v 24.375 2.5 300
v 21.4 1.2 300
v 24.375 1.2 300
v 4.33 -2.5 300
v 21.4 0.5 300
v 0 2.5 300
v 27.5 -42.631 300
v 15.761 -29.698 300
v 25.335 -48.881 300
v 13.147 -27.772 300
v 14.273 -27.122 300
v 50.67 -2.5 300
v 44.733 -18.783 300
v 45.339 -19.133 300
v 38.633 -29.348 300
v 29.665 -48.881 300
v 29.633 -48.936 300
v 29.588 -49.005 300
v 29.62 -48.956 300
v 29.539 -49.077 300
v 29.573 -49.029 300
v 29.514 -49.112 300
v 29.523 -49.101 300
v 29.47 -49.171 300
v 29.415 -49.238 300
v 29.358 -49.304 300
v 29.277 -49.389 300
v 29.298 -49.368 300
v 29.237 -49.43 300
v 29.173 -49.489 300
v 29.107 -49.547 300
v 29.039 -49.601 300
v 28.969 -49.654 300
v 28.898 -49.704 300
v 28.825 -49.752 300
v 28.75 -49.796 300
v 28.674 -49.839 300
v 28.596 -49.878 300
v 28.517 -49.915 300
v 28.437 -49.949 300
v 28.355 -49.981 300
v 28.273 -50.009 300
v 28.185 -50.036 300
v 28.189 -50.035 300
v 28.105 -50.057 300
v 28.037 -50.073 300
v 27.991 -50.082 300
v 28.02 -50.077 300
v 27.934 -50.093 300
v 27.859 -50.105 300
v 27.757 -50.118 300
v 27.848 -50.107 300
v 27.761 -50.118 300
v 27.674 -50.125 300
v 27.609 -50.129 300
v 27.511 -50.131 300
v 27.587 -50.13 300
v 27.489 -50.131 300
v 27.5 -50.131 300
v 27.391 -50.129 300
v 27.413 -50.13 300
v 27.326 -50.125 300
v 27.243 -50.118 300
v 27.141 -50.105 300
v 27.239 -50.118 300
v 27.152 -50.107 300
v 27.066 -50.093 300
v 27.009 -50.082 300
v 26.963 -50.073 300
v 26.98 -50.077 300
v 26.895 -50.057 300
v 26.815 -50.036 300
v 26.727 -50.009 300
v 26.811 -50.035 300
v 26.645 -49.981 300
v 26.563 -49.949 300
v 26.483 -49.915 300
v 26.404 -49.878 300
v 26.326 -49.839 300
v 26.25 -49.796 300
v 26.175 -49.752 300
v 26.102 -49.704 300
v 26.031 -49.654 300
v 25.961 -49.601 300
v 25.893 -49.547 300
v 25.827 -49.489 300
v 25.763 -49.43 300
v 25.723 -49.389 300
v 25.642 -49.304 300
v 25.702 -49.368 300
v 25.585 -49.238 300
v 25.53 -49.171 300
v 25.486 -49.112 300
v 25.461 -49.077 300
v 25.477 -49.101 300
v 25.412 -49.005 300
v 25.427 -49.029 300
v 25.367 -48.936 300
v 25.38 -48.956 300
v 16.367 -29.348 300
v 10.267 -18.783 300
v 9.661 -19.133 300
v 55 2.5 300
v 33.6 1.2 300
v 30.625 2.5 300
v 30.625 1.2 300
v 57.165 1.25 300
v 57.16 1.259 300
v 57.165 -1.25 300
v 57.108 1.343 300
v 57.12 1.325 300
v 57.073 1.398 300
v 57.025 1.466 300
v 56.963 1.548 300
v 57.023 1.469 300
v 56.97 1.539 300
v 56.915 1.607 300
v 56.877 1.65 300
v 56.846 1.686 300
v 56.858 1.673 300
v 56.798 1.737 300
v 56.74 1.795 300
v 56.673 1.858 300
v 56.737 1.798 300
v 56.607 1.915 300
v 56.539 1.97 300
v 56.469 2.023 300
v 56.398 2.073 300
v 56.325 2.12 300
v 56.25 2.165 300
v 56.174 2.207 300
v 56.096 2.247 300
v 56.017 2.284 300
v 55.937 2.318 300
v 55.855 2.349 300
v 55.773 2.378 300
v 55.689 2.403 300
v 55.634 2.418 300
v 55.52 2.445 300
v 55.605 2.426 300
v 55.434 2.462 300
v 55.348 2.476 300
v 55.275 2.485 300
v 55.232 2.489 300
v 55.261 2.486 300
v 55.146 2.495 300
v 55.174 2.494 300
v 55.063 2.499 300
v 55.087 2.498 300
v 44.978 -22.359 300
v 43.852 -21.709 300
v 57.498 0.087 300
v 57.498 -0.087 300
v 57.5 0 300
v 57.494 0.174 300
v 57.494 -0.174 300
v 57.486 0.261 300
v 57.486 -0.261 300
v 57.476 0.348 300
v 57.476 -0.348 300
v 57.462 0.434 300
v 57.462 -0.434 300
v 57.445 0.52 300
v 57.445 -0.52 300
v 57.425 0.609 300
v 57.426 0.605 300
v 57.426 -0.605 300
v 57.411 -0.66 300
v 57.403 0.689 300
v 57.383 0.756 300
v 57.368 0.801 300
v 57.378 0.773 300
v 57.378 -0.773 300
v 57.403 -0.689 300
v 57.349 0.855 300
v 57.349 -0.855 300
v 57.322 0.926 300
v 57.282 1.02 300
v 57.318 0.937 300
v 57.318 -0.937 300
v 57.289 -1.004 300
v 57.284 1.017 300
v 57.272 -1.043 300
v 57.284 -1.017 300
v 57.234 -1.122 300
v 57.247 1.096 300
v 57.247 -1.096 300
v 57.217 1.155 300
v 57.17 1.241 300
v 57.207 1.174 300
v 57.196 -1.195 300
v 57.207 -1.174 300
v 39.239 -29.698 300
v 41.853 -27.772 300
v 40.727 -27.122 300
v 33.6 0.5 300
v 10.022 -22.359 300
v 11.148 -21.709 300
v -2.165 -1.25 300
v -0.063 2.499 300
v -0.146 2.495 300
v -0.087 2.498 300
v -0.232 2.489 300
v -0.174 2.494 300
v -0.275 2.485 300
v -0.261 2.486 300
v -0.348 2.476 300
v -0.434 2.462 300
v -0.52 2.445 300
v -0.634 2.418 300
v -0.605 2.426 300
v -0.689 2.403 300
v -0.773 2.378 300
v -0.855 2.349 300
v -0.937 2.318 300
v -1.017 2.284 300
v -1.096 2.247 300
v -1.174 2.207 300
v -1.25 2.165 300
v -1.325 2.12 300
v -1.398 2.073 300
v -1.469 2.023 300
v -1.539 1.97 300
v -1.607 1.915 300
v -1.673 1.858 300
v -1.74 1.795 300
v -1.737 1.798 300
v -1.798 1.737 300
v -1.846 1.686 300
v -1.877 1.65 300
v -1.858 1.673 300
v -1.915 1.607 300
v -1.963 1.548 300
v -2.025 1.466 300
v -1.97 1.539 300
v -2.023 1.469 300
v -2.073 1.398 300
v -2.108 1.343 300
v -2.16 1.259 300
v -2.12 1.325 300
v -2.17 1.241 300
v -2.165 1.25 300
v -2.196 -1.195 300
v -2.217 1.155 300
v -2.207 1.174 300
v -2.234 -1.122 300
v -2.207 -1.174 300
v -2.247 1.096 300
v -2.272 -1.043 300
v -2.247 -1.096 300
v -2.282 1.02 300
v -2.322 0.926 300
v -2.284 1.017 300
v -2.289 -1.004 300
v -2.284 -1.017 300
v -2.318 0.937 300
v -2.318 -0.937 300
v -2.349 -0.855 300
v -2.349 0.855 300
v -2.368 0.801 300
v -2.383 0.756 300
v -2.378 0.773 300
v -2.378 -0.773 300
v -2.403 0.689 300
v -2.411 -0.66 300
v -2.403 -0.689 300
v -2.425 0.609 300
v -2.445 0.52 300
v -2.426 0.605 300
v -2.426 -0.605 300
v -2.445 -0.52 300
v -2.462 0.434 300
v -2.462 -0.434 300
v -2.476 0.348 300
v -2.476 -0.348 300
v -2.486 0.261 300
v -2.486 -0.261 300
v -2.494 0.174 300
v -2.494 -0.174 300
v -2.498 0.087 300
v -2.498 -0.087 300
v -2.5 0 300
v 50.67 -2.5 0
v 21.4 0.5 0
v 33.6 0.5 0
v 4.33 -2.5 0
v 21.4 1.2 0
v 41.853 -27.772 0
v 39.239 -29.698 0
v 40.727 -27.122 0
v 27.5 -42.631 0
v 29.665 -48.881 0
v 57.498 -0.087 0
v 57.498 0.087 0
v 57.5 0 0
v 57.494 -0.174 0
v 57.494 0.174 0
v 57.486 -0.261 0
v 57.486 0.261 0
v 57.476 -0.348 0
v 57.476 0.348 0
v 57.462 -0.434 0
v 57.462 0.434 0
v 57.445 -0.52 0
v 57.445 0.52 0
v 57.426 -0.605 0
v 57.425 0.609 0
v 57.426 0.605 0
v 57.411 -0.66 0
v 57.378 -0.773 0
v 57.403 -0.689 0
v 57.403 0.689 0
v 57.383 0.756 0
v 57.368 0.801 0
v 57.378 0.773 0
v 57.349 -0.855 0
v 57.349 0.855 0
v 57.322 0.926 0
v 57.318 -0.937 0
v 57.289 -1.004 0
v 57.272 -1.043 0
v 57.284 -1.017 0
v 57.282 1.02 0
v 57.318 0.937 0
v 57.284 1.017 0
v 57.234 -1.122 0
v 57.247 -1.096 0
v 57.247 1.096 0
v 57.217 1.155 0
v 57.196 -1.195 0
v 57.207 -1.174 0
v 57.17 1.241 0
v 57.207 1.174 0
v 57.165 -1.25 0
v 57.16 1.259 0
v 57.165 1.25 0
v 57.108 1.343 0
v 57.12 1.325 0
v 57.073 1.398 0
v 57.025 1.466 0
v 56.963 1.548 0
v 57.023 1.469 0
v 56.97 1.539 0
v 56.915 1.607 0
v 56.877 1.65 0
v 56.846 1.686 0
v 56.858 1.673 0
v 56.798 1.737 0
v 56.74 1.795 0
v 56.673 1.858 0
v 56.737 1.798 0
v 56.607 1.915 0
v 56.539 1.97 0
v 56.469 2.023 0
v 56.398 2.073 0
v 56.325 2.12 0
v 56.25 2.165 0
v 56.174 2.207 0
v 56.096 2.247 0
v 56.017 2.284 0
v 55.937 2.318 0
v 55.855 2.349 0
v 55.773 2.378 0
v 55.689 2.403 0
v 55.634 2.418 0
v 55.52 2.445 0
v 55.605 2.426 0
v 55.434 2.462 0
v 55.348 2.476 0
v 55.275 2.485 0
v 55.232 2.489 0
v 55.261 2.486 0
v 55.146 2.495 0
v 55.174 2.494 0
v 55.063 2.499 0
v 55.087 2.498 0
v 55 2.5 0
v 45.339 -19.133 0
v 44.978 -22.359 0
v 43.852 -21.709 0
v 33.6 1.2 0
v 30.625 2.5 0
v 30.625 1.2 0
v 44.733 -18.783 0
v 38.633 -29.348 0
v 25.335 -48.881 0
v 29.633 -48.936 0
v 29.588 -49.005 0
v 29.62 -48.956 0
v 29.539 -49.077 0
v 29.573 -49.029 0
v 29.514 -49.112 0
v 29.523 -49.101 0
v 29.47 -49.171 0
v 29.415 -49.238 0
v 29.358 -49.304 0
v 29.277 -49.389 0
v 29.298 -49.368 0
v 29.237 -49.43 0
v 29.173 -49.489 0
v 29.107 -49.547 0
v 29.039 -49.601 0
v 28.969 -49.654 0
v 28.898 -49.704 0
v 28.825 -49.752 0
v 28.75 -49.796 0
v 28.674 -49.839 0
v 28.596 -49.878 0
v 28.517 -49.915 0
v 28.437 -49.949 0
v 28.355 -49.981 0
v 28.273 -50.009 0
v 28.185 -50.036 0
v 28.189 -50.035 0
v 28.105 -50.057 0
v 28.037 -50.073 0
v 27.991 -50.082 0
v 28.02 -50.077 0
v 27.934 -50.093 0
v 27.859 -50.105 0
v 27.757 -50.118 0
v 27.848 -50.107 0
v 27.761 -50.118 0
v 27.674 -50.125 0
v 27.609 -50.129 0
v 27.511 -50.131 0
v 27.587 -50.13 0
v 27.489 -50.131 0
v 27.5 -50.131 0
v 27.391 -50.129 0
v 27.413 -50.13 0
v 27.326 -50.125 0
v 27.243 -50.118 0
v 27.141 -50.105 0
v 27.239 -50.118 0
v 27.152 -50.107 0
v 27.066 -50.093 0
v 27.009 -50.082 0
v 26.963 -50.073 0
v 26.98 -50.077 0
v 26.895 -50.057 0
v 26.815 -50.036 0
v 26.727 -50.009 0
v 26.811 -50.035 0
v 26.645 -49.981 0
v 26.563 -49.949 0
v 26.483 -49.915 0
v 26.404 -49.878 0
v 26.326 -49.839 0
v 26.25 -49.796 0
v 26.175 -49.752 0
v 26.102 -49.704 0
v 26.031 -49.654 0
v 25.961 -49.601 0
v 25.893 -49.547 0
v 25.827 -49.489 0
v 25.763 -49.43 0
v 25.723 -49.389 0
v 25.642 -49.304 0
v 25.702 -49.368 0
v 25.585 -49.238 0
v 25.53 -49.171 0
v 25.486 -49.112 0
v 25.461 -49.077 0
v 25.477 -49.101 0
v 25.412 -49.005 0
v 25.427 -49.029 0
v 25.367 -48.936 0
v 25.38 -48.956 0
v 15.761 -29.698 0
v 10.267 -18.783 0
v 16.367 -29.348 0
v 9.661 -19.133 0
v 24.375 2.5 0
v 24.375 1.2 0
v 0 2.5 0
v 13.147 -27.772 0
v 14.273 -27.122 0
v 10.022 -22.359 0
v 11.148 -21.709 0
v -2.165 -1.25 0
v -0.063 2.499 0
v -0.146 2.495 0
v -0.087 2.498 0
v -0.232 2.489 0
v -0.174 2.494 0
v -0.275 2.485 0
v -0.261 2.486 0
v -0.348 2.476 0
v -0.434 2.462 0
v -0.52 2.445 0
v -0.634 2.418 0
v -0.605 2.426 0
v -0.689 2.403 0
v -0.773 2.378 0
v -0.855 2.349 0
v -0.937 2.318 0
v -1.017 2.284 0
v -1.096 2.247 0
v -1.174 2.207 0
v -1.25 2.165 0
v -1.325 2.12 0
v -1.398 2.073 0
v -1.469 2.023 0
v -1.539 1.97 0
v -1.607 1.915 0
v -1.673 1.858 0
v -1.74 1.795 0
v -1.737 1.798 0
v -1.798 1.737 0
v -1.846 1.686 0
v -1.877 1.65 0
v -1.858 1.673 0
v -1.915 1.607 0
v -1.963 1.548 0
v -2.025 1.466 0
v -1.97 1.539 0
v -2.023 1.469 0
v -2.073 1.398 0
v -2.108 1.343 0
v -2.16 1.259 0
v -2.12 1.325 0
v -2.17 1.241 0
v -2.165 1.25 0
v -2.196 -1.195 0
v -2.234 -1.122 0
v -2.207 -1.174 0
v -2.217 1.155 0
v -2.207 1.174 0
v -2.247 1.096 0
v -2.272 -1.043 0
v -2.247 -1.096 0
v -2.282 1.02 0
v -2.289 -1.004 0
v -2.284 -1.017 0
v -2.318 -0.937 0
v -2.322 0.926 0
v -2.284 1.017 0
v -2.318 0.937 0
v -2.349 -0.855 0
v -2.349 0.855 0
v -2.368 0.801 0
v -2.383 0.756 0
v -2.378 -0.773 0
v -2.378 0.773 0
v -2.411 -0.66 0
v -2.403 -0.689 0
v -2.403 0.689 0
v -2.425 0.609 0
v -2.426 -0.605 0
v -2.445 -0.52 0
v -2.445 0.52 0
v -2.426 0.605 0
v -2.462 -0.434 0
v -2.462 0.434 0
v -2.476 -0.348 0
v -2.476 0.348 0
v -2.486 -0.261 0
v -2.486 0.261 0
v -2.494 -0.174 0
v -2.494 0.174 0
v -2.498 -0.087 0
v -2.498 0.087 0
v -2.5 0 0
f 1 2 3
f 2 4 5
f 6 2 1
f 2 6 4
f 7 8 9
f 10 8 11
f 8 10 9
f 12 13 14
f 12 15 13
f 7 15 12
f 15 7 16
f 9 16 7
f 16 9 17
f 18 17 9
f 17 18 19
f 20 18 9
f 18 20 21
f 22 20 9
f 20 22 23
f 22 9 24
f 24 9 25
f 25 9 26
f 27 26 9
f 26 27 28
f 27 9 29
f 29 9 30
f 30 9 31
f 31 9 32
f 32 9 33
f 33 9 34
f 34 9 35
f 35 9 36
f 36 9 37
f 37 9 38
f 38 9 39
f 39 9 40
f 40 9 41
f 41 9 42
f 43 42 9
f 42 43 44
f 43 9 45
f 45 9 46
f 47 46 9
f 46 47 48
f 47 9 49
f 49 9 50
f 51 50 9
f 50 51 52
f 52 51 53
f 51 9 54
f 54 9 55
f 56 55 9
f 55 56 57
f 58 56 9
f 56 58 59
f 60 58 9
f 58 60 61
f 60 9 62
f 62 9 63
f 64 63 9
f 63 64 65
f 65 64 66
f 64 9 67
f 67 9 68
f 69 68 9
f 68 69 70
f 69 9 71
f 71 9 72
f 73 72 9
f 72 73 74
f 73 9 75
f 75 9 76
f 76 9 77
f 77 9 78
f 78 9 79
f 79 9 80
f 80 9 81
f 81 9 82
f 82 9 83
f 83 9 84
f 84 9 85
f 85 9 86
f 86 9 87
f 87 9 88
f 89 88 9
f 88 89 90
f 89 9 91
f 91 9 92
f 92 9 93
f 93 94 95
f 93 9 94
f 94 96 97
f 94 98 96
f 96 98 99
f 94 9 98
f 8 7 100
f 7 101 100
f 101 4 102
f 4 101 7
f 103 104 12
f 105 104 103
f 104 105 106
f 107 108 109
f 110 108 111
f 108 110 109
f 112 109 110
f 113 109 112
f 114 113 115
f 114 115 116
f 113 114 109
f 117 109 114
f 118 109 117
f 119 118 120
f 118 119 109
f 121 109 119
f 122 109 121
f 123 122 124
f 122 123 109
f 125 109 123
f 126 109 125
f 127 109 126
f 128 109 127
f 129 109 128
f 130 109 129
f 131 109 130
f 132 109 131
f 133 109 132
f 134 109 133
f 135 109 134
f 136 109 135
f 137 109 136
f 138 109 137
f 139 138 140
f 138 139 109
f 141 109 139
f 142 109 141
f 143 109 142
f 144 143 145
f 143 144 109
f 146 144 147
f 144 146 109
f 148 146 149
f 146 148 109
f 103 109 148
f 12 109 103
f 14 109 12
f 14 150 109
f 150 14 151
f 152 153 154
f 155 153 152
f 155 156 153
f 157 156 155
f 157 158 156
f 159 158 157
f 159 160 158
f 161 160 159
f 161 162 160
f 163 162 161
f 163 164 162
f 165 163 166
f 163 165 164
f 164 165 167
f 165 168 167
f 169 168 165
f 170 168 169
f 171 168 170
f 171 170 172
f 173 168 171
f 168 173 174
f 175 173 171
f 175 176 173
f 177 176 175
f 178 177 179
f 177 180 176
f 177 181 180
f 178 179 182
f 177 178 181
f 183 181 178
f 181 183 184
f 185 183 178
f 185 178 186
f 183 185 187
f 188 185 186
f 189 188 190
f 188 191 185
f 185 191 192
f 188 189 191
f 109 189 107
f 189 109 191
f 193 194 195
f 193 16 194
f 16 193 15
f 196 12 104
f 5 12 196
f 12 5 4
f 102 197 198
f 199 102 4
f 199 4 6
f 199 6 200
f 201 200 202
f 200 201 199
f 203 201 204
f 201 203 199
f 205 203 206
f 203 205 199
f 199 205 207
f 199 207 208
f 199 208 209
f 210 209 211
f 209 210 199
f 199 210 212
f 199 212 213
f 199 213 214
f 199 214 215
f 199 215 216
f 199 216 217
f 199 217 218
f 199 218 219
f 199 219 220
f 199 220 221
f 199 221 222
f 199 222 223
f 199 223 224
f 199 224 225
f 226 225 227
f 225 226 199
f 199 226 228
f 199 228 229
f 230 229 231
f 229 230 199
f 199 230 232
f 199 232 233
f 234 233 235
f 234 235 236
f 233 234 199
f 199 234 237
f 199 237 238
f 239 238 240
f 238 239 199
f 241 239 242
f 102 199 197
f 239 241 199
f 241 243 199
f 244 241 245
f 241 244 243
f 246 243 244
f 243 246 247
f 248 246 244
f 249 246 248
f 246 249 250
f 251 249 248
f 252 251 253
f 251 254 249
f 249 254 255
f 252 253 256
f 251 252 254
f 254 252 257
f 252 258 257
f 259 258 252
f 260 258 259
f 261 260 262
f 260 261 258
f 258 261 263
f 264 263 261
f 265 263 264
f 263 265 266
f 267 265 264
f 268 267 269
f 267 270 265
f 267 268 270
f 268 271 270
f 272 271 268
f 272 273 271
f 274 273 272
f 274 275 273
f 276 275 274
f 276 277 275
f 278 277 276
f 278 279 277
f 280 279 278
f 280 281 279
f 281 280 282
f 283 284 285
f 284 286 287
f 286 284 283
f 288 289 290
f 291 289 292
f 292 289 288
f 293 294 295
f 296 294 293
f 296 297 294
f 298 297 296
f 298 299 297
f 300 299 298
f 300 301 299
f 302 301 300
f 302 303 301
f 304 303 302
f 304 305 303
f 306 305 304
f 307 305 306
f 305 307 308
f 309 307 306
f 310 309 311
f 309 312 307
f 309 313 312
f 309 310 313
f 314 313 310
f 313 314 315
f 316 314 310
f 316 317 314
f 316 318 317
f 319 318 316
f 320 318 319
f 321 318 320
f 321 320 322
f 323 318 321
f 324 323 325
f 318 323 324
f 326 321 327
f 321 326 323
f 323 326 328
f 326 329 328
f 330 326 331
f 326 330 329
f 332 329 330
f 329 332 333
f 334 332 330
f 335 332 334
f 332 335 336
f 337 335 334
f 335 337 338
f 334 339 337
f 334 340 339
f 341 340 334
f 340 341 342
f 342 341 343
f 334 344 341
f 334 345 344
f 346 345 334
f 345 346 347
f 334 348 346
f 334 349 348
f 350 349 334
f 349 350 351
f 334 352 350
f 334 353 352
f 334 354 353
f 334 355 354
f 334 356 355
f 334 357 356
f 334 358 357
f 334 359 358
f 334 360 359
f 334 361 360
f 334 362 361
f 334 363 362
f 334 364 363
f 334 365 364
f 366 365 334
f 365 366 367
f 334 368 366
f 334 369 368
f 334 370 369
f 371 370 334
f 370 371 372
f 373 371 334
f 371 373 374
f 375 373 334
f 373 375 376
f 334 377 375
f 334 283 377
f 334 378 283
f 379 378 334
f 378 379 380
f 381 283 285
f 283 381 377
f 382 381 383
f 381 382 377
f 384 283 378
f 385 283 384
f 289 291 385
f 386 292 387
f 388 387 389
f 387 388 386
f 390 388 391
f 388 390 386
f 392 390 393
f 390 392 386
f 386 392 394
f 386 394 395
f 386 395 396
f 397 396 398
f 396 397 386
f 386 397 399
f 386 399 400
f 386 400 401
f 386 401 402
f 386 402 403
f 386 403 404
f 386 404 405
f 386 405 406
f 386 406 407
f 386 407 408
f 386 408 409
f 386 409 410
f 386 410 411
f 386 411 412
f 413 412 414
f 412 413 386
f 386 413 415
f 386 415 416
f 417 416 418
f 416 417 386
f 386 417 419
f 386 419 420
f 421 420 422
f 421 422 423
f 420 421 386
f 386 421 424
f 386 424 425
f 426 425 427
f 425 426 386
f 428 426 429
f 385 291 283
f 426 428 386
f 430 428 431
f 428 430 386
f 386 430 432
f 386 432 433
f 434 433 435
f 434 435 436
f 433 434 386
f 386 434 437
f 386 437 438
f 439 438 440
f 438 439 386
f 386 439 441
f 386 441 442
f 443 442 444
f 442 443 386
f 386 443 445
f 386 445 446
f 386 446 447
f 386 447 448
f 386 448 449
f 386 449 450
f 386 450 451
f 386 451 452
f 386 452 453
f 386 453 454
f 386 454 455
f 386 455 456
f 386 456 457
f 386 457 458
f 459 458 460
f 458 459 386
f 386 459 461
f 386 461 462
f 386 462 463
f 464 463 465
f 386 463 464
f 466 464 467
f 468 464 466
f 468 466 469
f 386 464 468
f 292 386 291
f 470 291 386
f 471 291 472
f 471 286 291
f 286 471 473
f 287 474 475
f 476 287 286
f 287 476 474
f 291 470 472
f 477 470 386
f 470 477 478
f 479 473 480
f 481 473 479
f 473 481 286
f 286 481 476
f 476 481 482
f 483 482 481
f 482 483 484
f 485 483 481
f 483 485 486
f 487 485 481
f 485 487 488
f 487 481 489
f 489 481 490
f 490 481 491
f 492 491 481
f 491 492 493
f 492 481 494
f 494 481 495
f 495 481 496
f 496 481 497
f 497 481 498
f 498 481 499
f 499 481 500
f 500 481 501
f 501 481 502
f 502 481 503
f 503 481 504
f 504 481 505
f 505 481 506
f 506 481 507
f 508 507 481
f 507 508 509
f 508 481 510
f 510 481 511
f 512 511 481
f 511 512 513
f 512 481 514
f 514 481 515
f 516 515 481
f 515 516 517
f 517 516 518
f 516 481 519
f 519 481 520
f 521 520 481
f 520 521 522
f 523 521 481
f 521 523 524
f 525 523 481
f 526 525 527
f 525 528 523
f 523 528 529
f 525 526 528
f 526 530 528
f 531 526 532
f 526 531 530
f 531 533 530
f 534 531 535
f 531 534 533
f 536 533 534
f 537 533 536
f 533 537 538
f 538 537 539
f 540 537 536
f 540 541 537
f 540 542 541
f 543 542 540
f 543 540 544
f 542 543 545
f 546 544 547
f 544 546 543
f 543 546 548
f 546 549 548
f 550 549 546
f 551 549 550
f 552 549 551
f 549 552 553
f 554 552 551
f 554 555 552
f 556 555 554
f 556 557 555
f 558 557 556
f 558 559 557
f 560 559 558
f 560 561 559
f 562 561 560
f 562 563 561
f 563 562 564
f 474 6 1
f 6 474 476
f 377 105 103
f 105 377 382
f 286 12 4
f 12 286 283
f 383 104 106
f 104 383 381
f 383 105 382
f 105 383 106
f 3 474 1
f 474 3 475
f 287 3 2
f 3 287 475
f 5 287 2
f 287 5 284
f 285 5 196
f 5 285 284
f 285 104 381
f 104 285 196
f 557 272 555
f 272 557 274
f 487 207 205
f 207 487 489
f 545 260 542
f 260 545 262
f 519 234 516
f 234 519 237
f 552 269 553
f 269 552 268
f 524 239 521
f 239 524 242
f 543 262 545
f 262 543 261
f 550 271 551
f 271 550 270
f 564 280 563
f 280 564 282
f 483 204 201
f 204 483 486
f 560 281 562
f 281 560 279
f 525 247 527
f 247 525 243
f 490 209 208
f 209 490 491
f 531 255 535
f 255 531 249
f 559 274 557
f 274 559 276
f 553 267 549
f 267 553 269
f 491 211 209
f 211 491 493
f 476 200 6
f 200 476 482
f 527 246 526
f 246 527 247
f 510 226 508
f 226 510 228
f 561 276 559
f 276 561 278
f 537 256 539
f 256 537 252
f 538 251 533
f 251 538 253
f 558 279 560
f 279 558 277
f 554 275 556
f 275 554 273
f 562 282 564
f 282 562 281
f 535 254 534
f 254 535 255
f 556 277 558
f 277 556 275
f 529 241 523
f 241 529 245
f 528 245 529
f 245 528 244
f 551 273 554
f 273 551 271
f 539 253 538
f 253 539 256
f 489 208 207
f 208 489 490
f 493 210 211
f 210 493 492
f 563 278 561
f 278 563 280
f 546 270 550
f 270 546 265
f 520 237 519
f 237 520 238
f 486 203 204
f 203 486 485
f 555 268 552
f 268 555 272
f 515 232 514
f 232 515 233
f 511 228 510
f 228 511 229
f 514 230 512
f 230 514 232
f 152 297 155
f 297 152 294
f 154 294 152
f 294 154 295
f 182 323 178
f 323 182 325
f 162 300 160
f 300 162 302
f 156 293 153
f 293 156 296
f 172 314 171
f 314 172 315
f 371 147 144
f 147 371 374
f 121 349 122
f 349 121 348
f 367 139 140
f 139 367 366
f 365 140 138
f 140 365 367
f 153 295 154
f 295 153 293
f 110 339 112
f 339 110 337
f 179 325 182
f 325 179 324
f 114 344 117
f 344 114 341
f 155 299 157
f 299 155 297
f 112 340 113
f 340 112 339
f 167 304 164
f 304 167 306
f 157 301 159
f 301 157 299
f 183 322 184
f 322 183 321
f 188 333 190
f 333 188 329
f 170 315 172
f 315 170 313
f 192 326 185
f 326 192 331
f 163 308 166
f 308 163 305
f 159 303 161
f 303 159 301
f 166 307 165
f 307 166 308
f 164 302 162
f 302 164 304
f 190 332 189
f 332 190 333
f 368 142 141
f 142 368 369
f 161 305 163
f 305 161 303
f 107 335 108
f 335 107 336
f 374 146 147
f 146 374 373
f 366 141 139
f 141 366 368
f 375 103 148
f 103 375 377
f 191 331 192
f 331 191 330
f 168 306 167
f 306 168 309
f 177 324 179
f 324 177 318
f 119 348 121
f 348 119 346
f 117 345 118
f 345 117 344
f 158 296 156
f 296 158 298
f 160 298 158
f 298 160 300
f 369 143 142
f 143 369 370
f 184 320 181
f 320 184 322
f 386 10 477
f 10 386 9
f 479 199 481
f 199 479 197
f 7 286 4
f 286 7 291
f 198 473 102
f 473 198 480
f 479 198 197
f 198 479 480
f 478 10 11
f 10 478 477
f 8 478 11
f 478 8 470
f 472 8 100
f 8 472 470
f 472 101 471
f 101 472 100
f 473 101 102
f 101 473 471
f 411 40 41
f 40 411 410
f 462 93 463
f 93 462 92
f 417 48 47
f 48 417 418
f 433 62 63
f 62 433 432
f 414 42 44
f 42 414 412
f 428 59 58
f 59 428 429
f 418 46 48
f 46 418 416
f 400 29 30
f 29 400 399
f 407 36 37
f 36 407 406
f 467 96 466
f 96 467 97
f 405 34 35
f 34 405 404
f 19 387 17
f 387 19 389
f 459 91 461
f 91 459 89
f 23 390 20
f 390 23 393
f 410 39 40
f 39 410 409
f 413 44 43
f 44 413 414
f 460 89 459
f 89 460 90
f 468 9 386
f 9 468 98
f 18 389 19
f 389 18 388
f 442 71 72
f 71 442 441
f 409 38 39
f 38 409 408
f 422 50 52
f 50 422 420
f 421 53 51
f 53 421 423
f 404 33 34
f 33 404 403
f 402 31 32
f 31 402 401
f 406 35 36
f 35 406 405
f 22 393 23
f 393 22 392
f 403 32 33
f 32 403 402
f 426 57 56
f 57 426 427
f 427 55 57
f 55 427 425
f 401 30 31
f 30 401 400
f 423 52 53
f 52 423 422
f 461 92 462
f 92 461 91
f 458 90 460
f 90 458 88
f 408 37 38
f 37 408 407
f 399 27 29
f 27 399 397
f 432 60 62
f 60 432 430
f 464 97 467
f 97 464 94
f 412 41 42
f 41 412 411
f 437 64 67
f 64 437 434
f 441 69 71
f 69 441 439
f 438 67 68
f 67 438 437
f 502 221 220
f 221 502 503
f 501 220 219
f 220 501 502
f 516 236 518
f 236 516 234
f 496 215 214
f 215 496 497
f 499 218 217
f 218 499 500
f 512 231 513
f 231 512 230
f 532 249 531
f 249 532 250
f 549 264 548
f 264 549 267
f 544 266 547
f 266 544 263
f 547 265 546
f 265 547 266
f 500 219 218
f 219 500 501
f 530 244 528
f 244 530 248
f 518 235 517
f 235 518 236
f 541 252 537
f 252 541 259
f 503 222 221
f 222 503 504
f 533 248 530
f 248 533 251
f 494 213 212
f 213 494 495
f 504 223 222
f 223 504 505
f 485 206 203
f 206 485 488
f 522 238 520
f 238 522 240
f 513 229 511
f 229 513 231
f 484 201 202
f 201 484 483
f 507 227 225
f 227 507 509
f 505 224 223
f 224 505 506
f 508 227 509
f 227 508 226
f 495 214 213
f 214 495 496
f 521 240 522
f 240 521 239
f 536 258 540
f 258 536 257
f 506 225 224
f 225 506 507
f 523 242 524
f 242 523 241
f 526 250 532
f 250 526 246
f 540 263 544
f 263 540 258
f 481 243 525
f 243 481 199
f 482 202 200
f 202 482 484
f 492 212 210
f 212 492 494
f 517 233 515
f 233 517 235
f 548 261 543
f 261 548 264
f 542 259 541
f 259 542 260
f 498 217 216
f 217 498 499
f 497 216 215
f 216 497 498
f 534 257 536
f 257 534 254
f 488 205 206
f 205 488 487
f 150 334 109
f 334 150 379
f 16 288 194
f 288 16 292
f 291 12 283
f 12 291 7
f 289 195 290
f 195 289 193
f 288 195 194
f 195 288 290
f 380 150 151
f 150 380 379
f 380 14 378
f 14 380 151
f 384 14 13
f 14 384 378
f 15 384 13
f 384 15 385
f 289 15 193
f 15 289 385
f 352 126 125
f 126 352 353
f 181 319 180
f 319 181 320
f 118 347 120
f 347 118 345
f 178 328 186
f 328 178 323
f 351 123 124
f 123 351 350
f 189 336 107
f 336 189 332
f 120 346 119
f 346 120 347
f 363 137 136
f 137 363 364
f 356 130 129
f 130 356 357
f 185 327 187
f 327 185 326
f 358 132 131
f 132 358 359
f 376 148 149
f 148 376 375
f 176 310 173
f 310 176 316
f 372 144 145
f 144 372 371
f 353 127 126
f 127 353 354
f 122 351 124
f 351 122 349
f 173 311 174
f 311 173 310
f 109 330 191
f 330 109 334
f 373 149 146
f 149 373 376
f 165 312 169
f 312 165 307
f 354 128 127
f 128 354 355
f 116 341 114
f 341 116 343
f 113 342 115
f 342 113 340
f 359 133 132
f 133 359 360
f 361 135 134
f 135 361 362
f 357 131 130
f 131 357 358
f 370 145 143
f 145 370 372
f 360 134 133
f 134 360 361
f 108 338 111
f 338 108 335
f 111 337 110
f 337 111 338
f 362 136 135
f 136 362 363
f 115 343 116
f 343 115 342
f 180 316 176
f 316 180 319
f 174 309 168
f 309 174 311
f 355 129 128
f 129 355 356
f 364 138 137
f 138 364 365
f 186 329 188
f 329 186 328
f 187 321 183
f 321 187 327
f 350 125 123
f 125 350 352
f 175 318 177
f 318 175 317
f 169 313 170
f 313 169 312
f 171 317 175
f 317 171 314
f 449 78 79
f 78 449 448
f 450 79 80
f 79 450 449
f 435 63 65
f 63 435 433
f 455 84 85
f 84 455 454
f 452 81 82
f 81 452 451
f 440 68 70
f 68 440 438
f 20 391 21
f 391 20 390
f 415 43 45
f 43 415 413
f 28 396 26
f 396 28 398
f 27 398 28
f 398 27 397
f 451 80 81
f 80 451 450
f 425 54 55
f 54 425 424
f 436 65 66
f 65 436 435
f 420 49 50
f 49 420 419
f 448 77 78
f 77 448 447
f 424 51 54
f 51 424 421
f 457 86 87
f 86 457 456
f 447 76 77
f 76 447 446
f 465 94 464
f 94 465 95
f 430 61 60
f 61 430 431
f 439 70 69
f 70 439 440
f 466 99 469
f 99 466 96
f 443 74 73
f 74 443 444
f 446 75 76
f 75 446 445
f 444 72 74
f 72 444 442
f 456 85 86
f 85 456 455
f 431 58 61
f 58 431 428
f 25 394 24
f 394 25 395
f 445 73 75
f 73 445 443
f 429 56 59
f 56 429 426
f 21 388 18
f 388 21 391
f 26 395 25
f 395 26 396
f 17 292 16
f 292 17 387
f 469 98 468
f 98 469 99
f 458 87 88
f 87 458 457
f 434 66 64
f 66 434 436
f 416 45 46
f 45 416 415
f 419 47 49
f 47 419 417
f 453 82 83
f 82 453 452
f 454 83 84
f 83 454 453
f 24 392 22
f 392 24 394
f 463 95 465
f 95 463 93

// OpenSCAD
// file: BOSL2/std.scad
// Minimal BOSL2 compatibility shim for bundled gallery models.
// It implements only the helpers used by the imported OpenSCAD projects.

CENTER = [0, 0, 0];
BOTTOM = [0, 0, -1];
TOP = [0, 0, 1];
LEFT = [-1, 0, 0];
RIGHT = [1, 0, 0];
FRONT = [0, -1, 0];
BACK = [0, 1, 0];

module up(z=0) {
    translate([0, 0, z]) children();
}

module down(z=0) {
    translate([0, 0, -z]) children();
}

module attach(anchor=CENTER) {
    children();
}

module cuboid(size=[1, 1, 1], anchor=CENTER) {
    center = anchor == CENTER;
    translate(center ? [0, 0, 0] : [0, 0, size[2] / 2])
        cube(size, center=true);
    children();
}

module xcyl(h=1, r=1, anchor=CENTER) {
    center = anchor == CENTER;
    translate(center ? [0, 0, 0] : [h / 2, 0, 0])
        rotate([0, 90, 0])
            cylinder(h=h, r=r, center=true);
}
// main file
include <BOSL2/std.scad>

$fn=180;        //resolution

strip_length = 300;
strip_width = 12.2;
strip_depth = 0.7;
led_width = 6.25;
led_depth = 2;

block_width = 55;
block_depth = 5;

y_shift = -block_depth/2;

//polygon
//    TW = led_width
//    --
//   |  | TD = led_depth
// --    --
//|        | BD = strip_depth
// --------  left edge = (0,0)
//    BW = strip_width

TW = led_width;
TD = led_depth;
BW = strip_width;
BD = strip_depth;

points = [[0,0],[BW,0],
 [BW,BD],[(BW+TW)/2,BD],
 [(BW+TW)/2,TD],[(BW-TW)/2,TD],
 [(BW-TW)/2,BD],[0,BD]];
 
 module ledblock(yshift) {
    translate([0,yshift,0])
    union() {
        difference() {
            cube([block_width,block_depth,strip_length]);
            #translate([(block_width-strip_width)/2,
                block_depth-led_depth,0])
                linear_extrude(strip_length) polygon(points);
         }
         //add cylinders on each end
         translate([0,block_depth/2,0])
            cylinder(h=strip_length, d=block_depth);
         translate([block_width,block_depth/2,0])
            cylinder(h=strip_length, d=block_depth);
    }
}

ledblock(y_shift);


rotate([0,0,120])
    translate([-block_width,0,0])
        ledblock(y_shift);
        
translate([block_width,0,0])
    rotate([0,0,-120])
        ledblock(y_shift);
